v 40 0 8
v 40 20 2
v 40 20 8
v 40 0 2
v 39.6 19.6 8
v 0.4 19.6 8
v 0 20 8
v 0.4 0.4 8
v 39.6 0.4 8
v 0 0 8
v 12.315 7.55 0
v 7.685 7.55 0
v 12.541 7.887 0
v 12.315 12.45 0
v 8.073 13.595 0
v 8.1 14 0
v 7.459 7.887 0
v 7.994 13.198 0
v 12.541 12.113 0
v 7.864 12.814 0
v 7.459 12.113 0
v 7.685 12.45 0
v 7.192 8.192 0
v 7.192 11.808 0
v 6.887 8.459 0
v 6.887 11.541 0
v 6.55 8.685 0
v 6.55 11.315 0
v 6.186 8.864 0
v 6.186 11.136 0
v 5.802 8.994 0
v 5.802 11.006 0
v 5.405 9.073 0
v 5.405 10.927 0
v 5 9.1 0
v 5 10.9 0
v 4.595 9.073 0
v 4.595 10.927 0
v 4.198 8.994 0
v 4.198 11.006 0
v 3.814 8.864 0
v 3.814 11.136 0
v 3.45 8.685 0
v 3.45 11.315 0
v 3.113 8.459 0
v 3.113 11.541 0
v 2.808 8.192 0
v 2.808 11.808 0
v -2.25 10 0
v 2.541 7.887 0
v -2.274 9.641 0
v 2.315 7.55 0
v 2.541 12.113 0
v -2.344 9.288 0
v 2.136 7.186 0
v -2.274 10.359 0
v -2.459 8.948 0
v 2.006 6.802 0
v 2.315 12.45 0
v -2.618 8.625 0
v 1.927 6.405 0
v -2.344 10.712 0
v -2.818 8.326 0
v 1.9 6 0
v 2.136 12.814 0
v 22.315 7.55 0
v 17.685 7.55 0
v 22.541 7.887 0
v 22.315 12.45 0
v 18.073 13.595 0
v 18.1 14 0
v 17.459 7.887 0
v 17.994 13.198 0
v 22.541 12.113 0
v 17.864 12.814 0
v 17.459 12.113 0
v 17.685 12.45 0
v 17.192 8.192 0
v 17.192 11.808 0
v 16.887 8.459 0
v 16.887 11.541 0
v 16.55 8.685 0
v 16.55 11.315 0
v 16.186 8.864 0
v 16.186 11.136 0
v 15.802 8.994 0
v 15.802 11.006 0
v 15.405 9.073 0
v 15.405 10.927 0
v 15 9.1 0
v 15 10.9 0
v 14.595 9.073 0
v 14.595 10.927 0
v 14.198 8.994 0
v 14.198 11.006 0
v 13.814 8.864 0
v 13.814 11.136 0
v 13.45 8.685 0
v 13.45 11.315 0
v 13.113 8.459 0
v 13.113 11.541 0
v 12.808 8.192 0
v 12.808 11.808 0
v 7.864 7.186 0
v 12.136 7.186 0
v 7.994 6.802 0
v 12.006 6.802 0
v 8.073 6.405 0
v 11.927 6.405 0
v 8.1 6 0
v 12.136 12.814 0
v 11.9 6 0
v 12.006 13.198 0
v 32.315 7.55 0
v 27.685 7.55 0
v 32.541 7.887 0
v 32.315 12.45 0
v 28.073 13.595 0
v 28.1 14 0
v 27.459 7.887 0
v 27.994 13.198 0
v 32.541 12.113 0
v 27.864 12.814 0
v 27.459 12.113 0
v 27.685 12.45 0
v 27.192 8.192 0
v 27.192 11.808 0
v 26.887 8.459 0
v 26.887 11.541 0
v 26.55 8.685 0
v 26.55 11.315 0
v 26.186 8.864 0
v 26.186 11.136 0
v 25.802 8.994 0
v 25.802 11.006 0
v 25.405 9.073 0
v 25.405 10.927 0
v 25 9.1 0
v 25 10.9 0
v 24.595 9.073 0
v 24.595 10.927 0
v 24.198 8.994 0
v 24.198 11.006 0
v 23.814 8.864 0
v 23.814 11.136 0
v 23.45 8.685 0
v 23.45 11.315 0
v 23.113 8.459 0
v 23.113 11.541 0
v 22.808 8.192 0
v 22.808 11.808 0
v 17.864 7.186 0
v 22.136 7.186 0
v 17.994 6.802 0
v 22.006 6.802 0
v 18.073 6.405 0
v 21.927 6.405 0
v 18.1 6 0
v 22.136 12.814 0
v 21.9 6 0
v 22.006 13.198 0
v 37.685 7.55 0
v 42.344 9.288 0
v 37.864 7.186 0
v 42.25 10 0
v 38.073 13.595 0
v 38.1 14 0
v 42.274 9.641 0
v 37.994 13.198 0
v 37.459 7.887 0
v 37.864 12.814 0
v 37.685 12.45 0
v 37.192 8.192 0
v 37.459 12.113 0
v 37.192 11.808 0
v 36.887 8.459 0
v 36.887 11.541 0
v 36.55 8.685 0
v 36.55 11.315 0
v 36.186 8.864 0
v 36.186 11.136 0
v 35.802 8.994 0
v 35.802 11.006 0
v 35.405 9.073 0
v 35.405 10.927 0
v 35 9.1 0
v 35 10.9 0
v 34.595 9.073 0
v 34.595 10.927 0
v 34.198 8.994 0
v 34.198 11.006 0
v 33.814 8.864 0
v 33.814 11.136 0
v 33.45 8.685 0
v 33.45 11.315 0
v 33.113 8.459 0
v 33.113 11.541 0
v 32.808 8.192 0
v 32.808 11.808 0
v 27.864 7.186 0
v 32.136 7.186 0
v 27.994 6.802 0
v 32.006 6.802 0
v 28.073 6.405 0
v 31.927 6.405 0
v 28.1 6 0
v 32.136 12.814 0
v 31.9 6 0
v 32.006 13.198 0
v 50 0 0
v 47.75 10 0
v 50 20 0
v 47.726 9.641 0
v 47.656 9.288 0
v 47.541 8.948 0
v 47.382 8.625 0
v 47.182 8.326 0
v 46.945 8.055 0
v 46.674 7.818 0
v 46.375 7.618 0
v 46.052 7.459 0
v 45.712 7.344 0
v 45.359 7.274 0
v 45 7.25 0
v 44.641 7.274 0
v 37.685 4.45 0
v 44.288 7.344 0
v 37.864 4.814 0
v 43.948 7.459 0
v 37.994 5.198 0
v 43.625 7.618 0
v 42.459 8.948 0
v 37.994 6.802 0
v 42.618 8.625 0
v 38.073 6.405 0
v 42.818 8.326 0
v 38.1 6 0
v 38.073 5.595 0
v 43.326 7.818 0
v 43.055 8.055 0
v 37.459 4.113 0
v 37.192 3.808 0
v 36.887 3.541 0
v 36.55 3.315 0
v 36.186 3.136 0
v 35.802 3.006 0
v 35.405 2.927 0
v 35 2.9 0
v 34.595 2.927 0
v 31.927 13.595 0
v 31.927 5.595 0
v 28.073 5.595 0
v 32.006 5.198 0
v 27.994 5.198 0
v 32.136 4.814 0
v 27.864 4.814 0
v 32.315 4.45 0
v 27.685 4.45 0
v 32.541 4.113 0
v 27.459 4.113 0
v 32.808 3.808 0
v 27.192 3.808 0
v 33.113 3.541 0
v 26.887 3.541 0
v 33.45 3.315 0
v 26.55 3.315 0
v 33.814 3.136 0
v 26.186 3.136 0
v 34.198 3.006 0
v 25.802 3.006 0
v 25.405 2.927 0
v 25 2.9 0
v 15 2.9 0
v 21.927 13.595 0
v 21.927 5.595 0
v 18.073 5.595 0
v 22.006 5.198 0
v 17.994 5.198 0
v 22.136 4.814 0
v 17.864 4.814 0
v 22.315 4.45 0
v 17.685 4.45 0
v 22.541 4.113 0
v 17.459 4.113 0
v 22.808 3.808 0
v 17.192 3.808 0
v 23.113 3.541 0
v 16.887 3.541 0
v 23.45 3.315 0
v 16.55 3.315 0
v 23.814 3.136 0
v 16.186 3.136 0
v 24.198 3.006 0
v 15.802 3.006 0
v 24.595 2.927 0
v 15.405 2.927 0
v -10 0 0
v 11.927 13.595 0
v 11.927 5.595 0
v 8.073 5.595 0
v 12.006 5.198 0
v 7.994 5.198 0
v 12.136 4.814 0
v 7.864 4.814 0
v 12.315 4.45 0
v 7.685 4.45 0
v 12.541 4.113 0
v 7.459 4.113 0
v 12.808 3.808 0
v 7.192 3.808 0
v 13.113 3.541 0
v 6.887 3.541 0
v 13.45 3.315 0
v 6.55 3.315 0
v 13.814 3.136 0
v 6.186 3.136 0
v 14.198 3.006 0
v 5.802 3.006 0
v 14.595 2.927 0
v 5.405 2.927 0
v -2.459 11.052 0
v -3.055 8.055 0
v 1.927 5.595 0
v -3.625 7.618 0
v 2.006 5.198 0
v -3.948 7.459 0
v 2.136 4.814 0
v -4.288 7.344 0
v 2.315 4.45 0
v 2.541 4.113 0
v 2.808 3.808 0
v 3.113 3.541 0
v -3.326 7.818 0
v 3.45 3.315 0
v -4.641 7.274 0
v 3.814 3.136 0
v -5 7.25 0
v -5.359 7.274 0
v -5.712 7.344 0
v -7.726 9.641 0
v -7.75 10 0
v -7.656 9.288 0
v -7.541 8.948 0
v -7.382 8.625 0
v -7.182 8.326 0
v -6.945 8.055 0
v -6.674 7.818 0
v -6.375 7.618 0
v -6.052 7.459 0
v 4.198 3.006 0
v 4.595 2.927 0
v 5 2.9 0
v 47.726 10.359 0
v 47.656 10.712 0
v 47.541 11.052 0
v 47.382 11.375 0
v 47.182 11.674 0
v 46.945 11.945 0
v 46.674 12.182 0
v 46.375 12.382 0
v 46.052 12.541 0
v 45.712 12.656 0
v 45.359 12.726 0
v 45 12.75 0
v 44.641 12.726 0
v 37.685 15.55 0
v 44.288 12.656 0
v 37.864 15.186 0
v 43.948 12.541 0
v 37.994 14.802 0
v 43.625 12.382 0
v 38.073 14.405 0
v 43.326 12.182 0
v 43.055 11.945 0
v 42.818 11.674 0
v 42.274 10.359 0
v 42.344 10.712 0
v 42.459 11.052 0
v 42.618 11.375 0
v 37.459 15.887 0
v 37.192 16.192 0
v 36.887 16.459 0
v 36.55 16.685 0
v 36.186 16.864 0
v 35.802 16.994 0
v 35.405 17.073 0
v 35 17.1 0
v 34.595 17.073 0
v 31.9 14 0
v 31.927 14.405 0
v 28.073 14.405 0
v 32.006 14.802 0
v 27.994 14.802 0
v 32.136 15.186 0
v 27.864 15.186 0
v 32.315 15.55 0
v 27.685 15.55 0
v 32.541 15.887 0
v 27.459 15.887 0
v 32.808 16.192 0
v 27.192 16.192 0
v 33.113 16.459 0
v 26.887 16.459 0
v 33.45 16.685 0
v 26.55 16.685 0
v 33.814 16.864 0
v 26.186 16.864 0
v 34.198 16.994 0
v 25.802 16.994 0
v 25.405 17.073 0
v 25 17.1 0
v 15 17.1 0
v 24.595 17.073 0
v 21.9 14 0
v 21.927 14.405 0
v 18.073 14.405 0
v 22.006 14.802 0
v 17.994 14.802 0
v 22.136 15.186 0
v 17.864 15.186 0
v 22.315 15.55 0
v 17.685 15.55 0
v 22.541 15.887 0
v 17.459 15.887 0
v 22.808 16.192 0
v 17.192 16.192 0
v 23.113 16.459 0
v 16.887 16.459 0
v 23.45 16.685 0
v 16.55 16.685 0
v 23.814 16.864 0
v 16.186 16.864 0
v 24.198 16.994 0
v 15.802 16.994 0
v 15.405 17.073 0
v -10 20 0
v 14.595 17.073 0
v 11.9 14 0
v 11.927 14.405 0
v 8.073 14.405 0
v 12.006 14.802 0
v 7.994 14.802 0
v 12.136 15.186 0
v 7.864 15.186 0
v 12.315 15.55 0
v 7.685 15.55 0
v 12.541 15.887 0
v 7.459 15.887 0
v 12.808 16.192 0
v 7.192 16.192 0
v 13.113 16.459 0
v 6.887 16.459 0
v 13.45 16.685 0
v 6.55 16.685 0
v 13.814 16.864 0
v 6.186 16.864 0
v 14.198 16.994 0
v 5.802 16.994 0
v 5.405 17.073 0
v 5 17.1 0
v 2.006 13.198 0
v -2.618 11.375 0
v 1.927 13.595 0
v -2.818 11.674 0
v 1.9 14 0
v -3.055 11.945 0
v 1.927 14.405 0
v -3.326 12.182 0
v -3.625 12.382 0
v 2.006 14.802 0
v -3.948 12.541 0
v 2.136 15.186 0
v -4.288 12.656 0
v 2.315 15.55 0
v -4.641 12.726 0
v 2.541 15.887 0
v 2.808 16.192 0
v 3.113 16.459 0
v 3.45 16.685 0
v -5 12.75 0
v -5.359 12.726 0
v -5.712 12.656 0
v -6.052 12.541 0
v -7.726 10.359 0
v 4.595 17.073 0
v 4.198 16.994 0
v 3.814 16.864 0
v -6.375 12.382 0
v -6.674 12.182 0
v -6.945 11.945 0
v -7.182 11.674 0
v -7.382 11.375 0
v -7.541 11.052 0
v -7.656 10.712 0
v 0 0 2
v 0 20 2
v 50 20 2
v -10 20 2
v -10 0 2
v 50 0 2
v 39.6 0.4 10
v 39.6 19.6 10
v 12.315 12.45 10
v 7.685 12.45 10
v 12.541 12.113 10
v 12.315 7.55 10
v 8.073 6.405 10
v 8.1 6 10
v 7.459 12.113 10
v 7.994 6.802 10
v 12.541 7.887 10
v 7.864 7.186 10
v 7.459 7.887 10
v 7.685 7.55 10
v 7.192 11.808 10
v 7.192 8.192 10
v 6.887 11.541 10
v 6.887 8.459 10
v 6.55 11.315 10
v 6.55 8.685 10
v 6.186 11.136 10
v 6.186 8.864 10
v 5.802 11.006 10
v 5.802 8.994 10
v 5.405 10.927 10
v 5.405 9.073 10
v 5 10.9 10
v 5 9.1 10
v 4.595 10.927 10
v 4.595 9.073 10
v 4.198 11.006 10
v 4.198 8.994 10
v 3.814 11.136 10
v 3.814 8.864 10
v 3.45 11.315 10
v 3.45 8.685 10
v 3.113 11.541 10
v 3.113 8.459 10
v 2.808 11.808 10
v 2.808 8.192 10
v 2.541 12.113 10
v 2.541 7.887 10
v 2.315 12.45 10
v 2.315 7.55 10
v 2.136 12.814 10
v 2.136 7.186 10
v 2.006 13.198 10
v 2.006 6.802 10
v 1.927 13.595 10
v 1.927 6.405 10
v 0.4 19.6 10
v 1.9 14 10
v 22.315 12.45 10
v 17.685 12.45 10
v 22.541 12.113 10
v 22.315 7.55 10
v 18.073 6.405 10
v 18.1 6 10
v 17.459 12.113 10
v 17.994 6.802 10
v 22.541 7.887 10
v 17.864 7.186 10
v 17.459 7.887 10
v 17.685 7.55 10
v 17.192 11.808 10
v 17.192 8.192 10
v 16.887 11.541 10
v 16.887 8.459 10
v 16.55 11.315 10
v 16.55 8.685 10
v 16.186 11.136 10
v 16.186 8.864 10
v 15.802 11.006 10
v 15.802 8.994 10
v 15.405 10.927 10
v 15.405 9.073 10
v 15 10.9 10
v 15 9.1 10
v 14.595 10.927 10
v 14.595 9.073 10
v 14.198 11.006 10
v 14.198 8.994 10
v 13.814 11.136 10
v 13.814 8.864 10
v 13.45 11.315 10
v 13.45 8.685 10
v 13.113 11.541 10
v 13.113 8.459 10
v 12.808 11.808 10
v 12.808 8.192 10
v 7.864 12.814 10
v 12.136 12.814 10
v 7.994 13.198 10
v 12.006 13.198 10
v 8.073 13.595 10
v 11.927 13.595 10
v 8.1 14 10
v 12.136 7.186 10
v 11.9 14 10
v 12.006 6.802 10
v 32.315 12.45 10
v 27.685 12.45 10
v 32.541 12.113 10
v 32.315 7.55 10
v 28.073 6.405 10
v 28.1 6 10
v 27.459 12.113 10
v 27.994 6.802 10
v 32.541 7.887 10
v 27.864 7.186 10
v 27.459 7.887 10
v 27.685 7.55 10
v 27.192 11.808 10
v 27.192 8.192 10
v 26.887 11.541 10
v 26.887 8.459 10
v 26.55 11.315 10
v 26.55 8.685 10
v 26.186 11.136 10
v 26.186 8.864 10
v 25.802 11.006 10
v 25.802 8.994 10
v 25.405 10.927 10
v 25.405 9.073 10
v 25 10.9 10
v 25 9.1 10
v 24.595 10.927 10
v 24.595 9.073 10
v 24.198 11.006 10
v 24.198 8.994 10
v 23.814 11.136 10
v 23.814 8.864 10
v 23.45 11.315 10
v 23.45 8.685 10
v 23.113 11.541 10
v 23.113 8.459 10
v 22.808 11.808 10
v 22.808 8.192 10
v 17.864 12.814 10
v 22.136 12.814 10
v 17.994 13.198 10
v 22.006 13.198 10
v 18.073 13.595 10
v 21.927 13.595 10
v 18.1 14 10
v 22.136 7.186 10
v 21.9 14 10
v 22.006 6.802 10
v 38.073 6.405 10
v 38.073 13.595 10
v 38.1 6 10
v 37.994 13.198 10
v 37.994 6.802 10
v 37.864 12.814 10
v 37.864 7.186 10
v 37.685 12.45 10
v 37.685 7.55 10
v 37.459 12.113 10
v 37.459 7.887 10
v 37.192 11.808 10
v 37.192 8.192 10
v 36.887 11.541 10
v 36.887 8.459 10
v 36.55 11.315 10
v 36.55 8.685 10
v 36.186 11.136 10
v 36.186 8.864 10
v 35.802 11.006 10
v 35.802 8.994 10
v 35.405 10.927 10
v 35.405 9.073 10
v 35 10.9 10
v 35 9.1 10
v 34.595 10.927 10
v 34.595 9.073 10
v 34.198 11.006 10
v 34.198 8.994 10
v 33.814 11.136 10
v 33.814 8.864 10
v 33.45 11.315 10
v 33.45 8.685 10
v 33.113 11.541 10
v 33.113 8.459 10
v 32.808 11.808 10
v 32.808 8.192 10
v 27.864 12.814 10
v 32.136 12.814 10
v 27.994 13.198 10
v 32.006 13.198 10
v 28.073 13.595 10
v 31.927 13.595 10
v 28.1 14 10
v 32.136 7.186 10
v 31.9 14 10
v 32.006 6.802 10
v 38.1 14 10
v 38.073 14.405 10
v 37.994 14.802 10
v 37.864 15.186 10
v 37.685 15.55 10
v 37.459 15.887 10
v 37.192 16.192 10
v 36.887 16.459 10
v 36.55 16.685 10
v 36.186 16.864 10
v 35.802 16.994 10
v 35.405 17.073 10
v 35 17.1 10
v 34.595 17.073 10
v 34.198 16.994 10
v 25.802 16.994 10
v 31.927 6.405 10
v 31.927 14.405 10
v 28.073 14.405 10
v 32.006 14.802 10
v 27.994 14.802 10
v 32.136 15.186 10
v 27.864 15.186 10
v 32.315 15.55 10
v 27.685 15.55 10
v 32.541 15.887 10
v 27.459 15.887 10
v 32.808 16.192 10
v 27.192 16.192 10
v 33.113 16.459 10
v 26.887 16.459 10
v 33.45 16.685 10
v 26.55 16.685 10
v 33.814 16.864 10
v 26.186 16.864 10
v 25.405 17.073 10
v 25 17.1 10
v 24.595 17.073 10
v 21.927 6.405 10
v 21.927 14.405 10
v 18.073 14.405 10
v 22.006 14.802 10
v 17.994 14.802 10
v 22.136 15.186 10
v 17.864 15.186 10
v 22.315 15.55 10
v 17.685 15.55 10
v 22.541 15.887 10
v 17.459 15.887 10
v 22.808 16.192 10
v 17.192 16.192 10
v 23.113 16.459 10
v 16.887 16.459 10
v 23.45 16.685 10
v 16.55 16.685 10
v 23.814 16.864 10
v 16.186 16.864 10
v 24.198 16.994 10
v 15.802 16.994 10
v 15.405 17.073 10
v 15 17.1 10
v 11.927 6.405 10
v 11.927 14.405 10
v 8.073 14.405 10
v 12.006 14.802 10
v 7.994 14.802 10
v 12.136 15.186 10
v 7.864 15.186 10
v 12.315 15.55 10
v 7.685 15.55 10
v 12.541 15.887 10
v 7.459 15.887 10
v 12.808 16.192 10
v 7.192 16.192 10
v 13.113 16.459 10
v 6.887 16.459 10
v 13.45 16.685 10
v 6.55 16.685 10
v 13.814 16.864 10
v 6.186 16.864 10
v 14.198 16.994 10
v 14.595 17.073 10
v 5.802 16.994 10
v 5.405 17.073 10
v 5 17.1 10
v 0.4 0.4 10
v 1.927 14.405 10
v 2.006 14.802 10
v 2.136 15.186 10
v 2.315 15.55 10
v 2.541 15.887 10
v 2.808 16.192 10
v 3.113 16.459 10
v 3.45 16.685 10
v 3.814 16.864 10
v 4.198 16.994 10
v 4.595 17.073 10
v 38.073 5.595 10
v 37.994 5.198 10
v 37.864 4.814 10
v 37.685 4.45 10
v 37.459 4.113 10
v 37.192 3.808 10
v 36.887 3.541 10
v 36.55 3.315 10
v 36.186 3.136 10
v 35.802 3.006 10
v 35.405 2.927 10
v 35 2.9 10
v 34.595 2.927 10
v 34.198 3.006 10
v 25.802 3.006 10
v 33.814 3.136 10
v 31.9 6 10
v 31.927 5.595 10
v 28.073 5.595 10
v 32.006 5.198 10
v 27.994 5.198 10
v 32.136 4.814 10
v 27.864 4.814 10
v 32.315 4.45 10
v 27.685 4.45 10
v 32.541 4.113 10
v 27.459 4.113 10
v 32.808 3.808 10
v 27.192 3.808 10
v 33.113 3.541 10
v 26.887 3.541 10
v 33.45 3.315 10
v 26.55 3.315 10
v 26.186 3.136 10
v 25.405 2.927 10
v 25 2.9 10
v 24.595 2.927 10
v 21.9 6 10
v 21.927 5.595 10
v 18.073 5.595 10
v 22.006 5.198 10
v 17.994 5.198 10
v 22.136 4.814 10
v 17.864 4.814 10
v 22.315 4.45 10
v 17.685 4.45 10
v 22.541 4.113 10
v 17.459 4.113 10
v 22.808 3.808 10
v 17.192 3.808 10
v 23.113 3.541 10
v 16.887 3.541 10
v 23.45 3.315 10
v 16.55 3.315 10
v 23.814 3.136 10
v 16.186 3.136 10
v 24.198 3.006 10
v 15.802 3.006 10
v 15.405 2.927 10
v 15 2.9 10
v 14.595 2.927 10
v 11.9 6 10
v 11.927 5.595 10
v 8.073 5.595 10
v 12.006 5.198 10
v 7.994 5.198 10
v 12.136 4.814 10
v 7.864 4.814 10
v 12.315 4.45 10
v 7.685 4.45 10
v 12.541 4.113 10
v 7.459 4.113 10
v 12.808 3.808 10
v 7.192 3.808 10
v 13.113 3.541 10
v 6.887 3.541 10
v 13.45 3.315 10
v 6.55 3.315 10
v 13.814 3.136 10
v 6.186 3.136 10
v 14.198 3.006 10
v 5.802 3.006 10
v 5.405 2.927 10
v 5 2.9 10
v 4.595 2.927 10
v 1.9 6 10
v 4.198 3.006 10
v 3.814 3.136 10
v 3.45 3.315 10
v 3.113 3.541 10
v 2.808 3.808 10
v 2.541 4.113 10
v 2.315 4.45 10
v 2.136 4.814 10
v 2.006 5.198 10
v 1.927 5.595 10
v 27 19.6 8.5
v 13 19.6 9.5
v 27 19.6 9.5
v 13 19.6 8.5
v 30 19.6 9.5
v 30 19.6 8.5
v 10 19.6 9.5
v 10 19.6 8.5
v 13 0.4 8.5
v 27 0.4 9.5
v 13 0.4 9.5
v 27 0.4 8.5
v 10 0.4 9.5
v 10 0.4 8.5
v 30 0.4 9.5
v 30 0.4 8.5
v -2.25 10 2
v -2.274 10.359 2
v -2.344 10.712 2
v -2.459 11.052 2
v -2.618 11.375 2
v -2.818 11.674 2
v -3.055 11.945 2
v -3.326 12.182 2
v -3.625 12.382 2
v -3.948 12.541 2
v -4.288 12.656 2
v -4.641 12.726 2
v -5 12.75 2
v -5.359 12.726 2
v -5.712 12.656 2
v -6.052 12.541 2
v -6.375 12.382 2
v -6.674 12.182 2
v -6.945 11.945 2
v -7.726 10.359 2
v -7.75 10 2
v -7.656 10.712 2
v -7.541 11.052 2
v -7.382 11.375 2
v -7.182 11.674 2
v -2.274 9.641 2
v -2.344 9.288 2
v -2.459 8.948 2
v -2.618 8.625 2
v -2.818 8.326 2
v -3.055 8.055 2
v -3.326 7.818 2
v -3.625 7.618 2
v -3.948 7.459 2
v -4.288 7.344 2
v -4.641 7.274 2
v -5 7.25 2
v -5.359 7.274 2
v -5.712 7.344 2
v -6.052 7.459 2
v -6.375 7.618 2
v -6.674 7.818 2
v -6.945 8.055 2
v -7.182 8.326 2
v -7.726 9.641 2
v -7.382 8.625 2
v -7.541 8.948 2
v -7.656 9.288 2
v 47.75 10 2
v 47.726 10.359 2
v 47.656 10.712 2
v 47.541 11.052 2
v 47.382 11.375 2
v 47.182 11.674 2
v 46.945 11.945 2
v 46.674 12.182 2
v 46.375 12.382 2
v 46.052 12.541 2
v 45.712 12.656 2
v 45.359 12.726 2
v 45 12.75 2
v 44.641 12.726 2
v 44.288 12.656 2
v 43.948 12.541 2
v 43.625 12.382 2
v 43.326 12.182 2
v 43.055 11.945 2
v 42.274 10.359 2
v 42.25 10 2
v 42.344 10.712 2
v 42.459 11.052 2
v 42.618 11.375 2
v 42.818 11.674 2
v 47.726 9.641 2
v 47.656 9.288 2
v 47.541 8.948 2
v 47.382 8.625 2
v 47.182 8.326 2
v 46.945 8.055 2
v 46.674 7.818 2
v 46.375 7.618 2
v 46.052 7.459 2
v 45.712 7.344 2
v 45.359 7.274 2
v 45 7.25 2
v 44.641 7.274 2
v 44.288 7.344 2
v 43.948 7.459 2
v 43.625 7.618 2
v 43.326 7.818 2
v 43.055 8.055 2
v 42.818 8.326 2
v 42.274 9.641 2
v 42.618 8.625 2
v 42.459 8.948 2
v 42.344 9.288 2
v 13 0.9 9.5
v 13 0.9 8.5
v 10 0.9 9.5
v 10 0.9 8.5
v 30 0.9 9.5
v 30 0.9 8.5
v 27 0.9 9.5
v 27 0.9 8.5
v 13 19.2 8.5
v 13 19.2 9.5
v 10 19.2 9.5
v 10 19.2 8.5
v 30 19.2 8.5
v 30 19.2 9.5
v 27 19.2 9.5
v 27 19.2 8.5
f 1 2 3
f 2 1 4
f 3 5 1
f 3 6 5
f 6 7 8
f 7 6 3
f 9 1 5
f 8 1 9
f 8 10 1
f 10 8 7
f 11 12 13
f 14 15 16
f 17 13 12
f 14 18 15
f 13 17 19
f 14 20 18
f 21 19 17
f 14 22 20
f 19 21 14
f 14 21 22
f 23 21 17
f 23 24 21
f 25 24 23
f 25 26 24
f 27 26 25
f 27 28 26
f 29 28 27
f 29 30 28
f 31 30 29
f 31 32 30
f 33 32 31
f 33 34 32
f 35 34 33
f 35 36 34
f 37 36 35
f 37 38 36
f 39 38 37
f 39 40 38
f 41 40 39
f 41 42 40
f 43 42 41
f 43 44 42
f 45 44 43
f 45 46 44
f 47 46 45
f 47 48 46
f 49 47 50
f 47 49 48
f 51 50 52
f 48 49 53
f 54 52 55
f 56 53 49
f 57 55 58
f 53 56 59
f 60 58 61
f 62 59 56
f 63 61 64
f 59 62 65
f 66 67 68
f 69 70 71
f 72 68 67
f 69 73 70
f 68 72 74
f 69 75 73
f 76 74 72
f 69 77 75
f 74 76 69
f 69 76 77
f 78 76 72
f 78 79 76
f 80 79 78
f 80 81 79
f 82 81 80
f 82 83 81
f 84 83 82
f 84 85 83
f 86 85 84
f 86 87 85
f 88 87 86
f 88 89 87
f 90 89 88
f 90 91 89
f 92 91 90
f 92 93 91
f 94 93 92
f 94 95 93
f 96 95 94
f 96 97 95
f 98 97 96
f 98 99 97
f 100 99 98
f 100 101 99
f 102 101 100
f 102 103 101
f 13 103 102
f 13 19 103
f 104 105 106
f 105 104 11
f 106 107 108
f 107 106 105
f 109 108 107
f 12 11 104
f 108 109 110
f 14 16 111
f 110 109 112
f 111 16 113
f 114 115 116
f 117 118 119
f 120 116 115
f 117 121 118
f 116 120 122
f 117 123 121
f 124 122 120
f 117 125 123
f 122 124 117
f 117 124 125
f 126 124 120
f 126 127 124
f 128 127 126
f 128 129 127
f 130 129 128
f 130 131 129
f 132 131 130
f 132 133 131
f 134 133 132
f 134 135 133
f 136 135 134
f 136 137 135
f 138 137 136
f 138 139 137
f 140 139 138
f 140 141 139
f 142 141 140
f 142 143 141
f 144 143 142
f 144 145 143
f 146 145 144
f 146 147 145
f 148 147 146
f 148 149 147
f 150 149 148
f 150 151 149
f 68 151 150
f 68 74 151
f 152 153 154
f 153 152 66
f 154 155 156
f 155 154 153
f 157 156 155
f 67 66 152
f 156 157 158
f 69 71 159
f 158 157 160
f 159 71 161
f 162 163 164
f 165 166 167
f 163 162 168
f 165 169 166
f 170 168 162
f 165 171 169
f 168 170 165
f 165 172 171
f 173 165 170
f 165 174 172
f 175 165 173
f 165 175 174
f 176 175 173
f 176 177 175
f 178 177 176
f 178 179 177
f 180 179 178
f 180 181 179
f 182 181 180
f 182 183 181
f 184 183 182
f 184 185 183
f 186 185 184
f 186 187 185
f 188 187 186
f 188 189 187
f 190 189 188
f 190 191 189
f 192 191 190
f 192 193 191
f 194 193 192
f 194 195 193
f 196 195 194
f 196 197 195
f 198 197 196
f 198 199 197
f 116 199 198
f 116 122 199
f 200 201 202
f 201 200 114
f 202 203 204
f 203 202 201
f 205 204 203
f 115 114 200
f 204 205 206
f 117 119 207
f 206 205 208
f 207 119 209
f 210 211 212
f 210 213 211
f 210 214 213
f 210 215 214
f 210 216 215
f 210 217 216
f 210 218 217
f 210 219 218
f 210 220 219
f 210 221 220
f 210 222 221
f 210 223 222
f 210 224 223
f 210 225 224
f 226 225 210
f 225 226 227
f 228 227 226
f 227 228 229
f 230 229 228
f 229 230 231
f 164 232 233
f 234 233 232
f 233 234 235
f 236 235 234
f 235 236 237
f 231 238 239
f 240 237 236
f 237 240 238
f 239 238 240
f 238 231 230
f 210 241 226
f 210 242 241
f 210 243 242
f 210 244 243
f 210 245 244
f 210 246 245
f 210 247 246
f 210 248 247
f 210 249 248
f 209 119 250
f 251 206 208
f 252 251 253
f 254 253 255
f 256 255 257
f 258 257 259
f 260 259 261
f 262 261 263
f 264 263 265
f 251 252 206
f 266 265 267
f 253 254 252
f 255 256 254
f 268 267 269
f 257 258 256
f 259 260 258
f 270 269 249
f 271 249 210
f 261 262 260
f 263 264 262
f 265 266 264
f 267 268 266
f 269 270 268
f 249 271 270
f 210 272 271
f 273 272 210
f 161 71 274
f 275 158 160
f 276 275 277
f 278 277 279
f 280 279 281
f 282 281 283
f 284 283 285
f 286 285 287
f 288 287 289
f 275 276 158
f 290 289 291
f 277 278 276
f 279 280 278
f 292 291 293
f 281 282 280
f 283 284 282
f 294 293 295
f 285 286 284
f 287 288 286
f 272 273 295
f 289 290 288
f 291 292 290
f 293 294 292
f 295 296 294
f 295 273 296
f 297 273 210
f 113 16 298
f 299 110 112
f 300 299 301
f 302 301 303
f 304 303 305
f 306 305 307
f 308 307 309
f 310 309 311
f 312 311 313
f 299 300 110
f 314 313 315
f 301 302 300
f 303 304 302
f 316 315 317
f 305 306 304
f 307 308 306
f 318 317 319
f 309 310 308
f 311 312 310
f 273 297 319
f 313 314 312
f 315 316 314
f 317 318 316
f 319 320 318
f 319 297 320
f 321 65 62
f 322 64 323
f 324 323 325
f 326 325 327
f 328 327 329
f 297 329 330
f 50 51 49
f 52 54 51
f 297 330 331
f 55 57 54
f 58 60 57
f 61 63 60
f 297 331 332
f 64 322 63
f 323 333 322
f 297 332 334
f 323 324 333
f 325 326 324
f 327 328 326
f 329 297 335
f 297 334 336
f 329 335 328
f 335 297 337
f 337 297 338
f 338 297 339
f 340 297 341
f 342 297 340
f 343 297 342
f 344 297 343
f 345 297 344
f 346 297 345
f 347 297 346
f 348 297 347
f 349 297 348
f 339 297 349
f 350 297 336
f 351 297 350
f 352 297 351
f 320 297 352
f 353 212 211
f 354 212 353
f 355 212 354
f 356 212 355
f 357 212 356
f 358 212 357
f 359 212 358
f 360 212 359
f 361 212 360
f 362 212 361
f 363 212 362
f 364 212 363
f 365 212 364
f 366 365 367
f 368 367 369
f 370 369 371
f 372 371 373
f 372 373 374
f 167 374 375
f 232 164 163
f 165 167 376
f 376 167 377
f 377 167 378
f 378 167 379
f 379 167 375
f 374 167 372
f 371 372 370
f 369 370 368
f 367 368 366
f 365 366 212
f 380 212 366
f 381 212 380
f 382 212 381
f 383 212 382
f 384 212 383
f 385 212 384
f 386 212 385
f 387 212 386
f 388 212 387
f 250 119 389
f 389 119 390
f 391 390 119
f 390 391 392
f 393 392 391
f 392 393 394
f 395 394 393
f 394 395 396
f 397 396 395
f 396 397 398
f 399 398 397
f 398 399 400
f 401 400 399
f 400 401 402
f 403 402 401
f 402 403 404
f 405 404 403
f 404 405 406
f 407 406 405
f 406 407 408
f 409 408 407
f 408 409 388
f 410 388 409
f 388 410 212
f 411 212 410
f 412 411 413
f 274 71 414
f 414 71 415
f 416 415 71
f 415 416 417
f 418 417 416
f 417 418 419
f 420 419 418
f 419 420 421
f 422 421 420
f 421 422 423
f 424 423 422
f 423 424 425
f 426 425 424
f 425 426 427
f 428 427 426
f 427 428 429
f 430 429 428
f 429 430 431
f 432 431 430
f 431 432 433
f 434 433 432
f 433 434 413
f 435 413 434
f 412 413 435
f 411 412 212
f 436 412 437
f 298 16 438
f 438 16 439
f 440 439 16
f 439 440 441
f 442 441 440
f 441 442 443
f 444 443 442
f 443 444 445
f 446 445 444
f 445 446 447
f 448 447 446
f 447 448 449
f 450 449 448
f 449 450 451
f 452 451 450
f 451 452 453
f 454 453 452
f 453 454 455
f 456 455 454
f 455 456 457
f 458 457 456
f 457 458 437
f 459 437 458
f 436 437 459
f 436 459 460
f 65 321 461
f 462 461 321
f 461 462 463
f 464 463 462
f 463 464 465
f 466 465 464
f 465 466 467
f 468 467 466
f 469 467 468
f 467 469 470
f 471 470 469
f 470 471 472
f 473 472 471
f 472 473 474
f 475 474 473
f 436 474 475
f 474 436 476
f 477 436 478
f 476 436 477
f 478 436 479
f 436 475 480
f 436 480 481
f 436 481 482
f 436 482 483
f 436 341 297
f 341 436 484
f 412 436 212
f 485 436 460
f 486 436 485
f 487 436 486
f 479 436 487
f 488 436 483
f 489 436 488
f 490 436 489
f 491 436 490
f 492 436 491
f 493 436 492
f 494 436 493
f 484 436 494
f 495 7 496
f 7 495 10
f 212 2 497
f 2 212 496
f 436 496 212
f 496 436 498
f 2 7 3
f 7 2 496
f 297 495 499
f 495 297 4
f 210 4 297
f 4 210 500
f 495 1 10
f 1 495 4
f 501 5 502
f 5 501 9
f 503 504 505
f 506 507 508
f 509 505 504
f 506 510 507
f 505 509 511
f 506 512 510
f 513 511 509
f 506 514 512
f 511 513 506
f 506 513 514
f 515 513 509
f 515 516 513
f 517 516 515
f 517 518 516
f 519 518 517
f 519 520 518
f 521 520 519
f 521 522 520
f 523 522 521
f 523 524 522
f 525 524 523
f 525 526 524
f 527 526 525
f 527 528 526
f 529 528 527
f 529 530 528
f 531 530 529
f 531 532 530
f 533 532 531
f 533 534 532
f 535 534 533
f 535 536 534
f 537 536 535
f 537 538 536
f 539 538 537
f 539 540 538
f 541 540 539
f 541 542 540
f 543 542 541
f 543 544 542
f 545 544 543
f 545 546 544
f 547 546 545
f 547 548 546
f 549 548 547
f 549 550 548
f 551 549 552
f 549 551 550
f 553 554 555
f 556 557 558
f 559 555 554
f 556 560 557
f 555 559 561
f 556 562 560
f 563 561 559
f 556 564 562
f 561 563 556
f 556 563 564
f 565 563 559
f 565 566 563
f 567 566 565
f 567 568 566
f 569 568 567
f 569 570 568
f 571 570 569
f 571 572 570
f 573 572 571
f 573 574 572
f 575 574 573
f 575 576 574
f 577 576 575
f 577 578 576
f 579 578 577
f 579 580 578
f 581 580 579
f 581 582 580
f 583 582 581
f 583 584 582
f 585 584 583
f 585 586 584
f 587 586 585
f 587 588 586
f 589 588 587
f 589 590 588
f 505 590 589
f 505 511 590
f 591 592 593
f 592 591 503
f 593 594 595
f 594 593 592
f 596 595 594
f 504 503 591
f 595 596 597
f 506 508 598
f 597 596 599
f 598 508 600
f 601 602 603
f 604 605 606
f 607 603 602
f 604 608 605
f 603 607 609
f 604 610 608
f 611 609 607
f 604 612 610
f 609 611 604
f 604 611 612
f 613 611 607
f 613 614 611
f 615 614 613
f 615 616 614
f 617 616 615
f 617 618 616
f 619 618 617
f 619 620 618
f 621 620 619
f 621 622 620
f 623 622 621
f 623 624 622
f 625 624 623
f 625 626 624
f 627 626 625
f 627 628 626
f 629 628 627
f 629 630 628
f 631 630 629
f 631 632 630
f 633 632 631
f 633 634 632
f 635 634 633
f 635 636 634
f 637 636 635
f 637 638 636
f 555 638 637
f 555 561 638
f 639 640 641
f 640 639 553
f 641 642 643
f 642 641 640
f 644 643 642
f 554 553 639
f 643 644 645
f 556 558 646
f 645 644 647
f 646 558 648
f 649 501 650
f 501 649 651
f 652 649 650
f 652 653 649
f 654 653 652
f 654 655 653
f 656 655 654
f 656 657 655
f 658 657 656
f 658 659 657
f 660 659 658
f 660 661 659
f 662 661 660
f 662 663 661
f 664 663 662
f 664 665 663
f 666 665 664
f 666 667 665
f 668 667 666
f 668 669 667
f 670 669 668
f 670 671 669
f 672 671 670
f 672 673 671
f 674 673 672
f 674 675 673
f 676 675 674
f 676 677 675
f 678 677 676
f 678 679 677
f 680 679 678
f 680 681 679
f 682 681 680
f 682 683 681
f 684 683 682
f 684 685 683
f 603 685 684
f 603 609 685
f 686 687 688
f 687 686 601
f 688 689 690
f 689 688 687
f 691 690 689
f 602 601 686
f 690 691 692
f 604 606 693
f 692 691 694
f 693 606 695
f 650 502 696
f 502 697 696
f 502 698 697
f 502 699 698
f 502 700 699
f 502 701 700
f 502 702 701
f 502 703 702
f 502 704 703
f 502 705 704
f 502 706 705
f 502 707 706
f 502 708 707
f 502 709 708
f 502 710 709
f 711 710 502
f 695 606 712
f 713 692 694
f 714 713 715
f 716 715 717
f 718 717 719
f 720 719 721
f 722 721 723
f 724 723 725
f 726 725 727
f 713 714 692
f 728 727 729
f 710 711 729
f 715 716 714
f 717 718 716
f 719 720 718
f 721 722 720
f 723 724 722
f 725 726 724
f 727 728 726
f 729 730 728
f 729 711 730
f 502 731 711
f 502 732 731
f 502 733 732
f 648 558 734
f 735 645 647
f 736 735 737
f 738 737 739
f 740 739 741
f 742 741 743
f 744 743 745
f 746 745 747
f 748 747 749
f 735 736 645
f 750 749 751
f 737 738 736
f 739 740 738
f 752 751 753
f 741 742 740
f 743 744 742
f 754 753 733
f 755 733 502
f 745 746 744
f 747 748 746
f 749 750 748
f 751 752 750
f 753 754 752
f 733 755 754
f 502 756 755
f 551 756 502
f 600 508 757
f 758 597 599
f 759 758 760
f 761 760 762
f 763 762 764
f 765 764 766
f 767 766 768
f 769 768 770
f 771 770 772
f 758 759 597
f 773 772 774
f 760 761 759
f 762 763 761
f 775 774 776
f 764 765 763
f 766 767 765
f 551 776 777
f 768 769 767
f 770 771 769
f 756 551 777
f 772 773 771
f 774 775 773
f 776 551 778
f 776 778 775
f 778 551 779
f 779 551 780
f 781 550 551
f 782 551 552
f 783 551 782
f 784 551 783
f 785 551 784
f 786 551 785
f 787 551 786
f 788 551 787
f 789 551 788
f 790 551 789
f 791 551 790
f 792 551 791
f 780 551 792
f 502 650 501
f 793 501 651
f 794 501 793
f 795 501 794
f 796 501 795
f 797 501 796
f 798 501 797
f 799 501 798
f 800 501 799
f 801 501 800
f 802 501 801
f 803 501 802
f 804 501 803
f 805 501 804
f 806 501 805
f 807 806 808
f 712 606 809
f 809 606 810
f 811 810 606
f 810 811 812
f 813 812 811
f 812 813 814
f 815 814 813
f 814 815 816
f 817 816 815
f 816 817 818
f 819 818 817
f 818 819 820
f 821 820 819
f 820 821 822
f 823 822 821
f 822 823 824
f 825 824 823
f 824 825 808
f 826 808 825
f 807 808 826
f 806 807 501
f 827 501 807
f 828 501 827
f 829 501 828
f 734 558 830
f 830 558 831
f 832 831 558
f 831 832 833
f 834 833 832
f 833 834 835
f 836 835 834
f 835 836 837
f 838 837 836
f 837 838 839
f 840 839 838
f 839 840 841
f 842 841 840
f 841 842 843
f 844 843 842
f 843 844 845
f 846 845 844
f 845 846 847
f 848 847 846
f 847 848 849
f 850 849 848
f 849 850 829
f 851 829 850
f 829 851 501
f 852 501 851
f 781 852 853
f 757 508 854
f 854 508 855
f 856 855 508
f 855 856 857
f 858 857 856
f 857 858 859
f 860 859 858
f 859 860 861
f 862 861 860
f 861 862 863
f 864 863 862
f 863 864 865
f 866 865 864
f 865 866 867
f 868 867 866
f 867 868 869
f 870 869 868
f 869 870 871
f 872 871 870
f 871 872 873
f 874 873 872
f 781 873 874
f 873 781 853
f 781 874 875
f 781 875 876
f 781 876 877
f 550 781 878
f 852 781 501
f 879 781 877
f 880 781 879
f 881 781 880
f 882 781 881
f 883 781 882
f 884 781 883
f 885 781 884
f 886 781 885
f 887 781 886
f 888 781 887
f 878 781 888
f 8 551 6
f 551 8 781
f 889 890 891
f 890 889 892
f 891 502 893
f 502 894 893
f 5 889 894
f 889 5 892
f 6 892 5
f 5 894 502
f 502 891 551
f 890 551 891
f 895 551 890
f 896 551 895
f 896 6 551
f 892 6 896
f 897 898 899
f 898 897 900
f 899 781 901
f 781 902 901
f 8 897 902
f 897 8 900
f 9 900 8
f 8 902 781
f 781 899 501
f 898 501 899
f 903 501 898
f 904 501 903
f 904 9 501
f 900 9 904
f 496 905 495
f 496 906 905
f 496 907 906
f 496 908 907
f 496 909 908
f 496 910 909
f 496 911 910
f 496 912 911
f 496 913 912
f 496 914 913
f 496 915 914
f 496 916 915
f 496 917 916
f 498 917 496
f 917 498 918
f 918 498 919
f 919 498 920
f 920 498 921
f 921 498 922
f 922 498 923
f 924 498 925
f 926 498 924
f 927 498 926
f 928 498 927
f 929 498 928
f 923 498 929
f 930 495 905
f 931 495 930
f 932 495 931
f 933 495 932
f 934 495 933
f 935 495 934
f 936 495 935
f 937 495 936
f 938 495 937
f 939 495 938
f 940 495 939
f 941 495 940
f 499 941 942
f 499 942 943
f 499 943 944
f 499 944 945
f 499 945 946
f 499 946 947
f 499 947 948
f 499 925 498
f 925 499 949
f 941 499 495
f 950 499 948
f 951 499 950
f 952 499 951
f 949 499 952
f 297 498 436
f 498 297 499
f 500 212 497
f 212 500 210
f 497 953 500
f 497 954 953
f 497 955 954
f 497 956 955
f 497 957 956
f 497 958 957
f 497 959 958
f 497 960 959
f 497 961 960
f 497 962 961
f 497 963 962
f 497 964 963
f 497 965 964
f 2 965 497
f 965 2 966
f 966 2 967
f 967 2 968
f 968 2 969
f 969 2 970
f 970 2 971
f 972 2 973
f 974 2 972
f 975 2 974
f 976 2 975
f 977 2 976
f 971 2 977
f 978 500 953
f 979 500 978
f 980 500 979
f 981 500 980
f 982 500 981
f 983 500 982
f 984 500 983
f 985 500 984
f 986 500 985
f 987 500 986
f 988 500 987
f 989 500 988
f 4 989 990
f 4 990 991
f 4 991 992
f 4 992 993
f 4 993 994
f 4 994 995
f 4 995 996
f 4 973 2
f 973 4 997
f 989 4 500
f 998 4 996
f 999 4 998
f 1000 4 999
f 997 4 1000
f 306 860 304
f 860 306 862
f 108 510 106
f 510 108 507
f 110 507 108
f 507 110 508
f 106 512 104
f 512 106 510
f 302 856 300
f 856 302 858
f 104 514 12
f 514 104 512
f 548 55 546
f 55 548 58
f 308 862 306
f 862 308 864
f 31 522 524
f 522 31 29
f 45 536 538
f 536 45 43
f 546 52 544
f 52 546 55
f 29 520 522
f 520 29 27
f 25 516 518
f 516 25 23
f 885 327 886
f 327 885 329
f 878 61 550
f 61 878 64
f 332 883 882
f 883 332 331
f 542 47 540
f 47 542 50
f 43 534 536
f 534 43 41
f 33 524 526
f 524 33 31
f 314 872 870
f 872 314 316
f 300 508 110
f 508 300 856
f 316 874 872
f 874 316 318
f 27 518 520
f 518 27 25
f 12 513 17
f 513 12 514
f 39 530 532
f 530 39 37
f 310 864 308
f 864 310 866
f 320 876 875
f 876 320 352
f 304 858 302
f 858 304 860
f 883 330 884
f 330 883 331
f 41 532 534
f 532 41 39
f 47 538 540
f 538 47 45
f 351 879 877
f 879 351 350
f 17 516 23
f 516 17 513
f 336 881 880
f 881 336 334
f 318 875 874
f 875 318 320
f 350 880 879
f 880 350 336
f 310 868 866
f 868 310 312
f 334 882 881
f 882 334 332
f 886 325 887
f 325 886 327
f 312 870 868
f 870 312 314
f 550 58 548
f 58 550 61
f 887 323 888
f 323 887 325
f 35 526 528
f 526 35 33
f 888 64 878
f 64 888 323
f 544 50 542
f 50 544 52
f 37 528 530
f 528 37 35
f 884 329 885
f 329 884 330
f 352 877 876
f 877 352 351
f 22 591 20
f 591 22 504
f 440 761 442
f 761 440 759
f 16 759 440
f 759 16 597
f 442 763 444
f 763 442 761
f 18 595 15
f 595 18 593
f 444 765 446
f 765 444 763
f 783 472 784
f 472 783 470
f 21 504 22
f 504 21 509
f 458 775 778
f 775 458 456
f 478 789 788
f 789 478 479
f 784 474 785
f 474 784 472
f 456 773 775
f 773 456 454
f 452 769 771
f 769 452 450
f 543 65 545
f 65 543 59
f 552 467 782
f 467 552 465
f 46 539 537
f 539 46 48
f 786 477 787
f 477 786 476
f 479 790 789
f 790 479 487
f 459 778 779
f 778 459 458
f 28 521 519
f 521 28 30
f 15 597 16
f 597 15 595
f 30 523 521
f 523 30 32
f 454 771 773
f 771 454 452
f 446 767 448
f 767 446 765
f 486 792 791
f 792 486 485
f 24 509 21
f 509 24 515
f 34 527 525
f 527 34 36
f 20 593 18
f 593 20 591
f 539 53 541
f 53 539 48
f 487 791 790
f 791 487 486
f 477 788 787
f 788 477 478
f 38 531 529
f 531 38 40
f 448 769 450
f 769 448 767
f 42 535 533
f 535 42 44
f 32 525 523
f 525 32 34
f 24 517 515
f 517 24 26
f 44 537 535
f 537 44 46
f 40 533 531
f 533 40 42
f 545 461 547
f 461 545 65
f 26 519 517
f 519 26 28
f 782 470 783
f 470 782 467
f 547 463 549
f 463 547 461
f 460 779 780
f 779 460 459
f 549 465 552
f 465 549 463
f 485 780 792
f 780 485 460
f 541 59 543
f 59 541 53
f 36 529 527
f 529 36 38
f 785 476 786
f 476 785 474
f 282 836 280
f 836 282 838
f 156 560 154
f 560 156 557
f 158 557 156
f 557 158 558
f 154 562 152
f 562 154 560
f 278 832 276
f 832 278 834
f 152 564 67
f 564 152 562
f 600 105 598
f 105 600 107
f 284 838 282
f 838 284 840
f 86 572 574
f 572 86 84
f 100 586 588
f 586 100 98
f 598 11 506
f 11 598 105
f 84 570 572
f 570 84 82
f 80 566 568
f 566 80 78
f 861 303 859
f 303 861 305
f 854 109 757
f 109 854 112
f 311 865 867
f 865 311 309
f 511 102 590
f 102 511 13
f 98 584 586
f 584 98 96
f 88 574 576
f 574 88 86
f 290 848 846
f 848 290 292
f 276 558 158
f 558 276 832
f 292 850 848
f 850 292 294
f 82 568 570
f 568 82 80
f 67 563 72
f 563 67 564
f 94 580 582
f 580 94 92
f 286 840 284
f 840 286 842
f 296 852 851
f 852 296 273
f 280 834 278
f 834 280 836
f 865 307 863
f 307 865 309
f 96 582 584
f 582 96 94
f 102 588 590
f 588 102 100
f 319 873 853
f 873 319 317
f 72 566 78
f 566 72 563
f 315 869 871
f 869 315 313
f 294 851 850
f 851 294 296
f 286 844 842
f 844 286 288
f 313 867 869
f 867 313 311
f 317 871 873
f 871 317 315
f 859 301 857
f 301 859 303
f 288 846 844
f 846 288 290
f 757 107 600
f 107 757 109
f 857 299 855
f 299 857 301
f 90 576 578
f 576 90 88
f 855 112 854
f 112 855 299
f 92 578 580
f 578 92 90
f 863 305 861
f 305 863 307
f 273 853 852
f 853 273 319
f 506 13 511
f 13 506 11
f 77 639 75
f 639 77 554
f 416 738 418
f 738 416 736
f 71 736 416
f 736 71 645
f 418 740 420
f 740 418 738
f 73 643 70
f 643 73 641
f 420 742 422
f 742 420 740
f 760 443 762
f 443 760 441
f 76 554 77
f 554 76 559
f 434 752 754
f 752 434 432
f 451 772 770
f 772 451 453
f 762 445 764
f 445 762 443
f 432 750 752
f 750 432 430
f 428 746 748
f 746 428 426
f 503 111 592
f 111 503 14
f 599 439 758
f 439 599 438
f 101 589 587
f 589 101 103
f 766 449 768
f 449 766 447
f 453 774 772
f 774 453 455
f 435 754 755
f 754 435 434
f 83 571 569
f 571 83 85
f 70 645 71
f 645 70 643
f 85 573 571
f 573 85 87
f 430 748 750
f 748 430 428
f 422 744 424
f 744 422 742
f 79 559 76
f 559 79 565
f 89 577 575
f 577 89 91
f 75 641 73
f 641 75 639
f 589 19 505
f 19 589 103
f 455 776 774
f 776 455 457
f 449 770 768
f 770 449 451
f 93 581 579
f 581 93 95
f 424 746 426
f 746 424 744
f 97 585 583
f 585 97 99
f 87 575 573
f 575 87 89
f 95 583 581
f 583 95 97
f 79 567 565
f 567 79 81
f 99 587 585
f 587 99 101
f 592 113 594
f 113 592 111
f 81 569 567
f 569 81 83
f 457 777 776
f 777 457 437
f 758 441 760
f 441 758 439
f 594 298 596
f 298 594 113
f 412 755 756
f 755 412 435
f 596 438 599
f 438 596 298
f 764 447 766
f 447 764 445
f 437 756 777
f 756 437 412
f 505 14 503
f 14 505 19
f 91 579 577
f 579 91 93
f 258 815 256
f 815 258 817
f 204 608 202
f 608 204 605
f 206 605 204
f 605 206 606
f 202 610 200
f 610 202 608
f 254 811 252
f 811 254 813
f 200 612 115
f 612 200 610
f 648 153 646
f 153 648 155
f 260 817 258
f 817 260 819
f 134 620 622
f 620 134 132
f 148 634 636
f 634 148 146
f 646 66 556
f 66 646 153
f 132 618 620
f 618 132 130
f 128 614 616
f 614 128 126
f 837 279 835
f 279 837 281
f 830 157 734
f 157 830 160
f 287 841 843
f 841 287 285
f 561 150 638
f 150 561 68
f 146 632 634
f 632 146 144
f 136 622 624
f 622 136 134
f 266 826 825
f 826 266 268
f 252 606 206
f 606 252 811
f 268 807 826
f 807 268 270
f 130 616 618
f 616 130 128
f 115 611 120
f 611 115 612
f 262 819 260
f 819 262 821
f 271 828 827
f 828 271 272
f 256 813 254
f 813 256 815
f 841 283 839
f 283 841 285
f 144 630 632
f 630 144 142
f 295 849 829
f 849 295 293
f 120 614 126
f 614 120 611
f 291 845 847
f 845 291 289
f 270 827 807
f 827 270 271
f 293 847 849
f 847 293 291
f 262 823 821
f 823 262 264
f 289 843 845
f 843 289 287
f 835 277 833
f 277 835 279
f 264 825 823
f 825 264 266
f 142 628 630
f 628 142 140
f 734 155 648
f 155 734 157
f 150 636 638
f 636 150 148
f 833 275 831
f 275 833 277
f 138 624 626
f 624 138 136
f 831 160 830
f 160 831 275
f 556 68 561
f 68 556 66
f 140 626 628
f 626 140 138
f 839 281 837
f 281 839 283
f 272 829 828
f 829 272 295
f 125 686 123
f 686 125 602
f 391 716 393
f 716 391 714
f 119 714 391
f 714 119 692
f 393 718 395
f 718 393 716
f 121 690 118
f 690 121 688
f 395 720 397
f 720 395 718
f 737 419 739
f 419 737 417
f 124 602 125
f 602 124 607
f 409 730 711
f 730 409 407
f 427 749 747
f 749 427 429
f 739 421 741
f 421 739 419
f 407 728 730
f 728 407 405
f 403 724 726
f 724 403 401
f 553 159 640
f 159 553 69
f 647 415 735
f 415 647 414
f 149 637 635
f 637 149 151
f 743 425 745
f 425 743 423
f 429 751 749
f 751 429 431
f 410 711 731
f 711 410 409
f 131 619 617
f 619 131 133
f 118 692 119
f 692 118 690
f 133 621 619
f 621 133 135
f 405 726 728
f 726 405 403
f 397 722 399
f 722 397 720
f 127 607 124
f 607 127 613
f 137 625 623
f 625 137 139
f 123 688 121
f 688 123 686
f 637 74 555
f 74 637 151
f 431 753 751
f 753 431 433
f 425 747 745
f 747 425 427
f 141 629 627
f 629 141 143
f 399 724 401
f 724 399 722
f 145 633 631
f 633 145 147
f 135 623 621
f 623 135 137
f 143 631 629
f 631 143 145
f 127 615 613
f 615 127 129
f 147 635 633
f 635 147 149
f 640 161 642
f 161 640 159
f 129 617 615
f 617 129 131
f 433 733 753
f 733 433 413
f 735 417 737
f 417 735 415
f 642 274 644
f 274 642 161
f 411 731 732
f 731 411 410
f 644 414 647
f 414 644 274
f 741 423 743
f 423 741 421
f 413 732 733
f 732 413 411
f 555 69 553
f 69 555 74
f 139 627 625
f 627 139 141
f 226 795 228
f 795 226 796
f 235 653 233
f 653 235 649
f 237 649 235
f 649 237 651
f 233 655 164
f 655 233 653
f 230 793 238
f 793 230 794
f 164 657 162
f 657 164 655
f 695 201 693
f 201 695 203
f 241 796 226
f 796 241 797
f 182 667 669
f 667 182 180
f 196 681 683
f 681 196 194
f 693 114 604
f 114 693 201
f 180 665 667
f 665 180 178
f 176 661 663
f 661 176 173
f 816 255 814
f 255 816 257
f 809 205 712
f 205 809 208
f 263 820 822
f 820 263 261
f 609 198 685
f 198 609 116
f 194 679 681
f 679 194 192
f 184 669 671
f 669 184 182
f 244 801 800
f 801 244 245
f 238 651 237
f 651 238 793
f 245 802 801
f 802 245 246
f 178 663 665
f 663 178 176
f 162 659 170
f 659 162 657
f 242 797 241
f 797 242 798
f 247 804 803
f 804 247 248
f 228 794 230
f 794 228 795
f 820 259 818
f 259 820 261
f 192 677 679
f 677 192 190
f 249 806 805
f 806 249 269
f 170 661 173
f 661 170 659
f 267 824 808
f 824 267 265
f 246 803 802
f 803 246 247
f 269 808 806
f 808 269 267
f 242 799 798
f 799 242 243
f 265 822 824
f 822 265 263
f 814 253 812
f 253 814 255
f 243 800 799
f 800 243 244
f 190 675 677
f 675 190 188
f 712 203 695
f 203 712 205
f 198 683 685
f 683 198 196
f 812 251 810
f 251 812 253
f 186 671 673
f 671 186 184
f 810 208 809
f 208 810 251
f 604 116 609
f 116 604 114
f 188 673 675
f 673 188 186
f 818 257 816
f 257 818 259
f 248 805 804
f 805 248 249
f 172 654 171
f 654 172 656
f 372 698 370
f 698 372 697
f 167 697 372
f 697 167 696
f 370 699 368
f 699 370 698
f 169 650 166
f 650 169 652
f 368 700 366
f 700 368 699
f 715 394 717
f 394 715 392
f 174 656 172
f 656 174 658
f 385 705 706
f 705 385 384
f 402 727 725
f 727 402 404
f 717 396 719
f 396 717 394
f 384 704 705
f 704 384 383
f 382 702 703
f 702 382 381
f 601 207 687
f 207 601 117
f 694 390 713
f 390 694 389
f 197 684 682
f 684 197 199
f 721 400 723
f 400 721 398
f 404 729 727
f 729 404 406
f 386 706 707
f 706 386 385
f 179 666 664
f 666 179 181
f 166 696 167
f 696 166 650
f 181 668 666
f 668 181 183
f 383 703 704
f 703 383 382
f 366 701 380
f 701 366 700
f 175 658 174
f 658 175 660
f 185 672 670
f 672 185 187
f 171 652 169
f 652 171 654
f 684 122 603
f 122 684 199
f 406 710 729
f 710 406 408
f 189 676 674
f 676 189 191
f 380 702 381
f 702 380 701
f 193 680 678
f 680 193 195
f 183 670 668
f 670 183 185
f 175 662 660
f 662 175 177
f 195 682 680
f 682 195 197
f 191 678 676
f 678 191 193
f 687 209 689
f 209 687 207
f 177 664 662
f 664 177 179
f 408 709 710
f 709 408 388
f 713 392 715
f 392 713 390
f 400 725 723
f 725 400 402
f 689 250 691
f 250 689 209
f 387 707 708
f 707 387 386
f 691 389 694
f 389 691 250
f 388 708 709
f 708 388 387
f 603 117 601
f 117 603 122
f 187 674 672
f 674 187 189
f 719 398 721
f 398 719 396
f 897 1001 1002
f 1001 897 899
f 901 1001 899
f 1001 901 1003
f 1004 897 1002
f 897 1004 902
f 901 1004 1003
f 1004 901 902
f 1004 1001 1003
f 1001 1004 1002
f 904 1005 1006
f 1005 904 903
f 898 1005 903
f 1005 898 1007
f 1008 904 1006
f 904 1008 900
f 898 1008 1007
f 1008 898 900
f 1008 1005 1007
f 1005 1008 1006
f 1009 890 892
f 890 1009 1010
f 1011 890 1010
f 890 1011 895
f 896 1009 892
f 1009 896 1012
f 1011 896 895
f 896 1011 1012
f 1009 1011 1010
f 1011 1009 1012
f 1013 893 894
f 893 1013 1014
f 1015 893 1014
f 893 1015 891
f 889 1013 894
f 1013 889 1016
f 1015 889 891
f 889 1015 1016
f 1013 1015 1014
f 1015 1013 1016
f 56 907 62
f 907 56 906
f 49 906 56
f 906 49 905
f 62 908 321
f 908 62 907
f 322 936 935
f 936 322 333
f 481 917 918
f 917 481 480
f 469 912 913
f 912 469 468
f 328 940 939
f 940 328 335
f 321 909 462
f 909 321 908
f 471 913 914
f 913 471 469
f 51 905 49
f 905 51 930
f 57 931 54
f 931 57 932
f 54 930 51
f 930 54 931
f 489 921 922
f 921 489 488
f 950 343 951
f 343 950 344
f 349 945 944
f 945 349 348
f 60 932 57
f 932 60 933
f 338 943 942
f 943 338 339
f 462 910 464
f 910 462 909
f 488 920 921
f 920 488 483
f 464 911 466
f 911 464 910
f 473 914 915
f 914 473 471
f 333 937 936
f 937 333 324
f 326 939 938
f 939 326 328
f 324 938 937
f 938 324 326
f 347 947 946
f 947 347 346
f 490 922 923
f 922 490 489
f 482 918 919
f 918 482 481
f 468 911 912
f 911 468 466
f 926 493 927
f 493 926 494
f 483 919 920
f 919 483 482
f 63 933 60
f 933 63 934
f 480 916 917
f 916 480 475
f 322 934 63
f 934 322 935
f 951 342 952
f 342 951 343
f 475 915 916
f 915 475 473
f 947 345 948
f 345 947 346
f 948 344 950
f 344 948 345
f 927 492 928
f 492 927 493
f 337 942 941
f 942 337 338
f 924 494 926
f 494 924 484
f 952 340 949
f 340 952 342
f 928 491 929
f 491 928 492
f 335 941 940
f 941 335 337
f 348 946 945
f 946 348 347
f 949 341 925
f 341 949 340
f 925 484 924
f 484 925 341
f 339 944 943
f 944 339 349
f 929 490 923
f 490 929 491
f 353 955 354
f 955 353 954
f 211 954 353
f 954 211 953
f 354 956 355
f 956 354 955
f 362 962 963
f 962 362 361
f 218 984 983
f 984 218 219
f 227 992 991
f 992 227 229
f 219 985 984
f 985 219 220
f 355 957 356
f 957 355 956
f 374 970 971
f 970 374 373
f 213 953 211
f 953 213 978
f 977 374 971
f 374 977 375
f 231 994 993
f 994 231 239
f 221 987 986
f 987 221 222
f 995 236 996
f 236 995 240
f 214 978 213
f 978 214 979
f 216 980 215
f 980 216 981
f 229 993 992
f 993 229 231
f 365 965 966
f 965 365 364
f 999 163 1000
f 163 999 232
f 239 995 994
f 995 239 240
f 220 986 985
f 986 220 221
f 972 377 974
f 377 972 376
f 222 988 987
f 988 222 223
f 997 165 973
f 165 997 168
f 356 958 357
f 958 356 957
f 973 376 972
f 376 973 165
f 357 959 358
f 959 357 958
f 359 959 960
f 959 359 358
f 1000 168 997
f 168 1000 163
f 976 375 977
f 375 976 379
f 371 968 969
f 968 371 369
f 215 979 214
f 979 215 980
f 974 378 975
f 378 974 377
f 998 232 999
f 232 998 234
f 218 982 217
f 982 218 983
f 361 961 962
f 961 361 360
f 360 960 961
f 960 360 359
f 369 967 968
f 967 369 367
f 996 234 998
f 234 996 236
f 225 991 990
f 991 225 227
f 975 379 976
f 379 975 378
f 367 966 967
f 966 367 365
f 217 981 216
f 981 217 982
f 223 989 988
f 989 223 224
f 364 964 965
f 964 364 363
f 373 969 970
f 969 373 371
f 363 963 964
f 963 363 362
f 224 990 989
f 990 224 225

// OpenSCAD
difference()
{
    union()
    {
        cube([40,20,8]);
        
        translate([.4,.4,8])
            cube([40-.8,20-.8,2]);
        
        translate([-10,0,0])
            cube([10,20,2]);
        
        translate([40,0,0])
            cube([10,20,2]);
    }
    union()
    {
        translate([10,.4,8.5])
            cube([3,.5,1]);
        translate([40-10-3,.4,8.5])
            cube([3,.5,1]);
        
        translate([10,20-.4*2,8.5])
            cube([3,.5,1]);
        translate([40-10-3,20-.4*2,8.5])
            cube([3,.5,1]);
        
        translate([-10+5,10,0])
            cylinder(d=5.5,h=20,$fn=48);
        
        translate([40+5,10,0])
            cylinder(d=5.5,h=20,$fn=48);
        
        for(i=[0:1:3])
        {
            translate([5+i*10,5+1,0])
                cylinder(d=6.2,h=20,$fn=48);
            
            translate([5+i*10,15-1,0])
                cylinder(d=6.2,h=20,$fn=48);
        }
    }
}
